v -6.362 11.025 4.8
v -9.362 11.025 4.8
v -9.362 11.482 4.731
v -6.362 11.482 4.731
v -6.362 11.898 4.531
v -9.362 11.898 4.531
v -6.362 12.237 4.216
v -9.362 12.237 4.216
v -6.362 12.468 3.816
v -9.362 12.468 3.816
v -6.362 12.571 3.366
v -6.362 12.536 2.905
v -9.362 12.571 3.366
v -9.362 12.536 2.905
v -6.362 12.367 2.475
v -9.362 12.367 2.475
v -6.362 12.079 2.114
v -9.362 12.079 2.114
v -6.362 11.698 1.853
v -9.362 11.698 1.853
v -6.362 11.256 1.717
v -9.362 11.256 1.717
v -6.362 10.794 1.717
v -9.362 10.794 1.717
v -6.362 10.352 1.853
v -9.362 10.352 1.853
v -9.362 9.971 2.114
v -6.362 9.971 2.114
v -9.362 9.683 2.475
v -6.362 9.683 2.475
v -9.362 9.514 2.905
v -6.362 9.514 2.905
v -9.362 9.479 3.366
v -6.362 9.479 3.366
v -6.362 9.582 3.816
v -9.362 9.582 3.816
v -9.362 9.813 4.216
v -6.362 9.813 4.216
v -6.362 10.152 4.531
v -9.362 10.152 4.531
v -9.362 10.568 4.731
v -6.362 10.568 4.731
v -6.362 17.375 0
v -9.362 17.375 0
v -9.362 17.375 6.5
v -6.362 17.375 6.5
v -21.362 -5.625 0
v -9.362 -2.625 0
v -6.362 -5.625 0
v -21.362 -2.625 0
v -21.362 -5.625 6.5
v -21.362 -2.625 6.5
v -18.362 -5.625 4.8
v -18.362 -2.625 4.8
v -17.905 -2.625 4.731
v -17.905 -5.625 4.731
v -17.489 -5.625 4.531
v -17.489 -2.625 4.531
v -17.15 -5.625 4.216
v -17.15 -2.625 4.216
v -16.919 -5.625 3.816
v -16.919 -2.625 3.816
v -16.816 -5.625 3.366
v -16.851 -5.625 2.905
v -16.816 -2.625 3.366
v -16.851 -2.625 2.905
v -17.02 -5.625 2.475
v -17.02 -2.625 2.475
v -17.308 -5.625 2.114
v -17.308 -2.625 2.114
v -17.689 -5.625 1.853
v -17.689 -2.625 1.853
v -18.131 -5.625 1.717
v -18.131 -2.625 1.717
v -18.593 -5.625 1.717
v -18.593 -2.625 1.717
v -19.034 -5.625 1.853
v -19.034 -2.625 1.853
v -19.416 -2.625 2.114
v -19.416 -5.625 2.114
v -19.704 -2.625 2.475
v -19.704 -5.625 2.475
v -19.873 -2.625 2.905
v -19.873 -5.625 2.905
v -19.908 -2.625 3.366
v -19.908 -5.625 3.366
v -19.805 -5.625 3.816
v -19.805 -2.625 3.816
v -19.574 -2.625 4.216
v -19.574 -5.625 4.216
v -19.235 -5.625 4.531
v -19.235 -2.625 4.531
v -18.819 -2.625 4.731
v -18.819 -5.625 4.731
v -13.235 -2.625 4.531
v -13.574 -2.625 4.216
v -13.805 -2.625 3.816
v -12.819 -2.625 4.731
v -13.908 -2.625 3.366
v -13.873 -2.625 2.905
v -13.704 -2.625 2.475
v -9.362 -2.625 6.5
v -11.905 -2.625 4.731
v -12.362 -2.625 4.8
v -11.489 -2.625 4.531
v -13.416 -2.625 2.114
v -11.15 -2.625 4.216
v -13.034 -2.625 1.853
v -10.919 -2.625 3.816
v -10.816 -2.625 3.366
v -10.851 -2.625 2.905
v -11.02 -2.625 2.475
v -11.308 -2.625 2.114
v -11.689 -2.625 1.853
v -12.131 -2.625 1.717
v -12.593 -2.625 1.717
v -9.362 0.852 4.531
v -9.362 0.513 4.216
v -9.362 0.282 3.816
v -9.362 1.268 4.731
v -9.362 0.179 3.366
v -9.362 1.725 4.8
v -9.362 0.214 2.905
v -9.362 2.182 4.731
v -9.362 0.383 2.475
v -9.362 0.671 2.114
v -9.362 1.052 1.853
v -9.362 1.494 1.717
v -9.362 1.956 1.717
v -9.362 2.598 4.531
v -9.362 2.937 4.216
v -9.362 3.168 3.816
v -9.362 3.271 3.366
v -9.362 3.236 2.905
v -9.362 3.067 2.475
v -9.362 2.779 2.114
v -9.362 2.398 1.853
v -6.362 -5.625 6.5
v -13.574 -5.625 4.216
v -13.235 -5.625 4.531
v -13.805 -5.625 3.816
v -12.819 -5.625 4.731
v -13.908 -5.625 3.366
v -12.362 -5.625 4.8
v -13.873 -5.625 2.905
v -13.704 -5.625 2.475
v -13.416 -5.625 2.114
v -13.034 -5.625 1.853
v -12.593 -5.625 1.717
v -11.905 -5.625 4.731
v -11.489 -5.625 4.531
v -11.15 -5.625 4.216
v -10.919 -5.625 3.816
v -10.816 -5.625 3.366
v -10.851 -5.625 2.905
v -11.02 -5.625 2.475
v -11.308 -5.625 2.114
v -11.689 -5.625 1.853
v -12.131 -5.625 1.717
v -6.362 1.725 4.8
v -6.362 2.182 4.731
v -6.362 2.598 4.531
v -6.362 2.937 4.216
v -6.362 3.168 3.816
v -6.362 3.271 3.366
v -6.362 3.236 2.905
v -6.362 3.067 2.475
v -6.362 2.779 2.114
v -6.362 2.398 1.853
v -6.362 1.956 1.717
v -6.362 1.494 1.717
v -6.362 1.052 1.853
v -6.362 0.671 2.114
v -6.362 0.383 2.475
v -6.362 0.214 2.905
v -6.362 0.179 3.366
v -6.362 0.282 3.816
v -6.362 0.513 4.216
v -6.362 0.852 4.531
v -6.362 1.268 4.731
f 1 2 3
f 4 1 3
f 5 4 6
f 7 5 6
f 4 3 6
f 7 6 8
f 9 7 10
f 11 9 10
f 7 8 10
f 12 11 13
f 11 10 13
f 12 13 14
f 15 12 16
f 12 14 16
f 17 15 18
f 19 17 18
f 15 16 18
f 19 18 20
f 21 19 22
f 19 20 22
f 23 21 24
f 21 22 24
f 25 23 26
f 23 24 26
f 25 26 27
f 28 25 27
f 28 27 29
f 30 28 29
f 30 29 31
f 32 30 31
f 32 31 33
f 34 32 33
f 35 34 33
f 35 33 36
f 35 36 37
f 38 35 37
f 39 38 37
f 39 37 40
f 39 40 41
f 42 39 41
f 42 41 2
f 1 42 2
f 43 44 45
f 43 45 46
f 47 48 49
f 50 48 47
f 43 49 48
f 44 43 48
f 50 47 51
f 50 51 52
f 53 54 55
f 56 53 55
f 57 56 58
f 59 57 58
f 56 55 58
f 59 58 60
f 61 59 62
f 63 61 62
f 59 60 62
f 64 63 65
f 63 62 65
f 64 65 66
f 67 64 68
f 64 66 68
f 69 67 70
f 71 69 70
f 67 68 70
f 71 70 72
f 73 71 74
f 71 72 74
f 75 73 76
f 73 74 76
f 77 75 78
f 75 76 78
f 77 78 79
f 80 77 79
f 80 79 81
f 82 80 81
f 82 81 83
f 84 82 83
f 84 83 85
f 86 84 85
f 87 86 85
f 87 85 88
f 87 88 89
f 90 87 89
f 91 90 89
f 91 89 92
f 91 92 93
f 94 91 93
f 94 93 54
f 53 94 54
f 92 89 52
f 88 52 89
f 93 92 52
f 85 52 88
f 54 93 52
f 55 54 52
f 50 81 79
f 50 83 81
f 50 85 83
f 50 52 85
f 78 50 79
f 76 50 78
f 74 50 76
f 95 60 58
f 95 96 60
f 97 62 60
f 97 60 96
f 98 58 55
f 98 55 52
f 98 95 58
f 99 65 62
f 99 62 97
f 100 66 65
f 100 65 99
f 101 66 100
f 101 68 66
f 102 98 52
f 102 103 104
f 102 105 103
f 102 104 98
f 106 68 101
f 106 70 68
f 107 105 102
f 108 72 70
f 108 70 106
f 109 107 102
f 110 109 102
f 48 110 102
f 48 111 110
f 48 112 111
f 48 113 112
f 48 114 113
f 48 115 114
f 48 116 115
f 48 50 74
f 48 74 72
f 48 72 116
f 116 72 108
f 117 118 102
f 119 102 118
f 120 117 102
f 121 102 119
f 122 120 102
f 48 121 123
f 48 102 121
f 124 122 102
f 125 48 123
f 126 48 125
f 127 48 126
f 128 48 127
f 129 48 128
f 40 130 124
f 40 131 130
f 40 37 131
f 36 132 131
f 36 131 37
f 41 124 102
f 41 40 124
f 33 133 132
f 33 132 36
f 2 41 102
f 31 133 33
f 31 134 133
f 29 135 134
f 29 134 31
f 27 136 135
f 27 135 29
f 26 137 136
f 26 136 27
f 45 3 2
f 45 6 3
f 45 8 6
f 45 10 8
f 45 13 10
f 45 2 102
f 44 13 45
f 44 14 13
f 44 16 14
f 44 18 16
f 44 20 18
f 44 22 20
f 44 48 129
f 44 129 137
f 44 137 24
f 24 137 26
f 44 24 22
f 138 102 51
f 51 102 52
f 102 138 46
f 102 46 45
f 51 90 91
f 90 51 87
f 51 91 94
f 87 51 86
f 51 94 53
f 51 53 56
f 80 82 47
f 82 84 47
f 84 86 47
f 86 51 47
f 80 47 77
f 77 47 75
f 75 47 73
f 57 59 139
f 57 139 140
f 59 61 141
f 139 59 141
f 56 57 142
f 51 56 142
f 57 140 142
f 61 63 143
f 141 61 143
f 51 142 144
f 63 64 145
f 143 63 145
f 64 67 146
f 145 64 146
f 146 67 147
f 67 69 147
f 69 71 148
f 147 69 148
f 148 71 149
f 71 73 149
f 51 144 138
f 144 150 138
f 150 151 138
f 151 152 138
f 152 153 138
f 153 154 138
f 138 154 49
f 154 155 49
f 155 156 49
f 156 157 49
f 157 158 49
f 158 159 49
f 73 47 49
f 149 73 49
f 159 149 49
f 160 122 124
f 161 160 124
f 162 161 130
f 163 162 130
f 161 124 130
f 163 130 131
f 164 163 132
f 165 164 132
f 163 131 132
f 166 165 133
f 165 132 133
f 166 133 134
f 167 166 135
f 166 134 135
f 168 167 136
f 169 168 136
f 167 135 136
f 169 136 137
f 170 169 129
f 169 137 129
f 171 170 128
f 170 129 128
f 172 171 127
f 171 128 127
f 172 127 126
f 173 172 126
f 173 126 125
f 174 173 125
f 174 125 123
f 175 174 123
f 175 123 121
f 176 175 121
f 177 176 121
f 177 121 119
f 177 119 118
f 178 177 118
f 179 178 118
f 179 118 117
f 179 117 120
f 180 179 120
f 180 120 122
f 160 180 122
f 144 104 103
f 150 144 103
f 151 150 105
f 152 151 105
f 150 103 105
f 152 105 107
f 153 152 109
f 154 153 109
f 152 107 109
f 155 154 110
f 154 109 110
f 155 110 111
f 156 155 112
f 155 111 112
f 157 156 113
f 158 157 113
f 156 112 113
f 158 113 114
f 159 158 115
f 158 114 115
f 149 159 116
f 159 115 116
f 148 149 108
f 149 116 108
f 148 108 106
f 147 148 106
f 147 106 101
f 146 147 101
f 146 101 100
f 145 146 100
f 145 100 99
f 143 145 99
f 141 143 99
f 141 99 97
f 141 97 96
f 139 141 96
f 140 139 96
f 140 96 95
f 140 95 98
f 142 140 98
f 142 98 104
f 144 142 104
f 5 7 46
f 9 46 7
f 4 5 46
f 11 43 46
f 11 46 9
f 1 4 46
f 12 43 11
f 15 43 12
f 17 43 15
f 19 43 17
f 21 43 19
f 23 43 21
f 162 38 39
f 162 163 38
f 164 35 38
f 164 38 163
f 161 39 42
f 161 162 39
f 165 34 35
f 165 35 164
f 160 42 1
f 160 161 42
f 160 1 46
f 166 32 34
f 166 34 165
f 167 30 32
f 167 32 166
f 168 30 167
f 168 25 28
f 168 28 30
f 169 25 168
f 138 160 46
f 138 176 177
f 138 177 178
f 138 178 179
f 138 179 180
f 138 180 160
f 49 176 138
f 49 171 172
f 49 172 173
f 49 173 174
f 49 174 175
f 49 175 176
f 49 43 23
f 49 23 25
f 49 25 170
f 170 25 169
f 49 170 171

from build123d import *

# Parameters (mm, degrees)
BOSS_EXTRUDE1_DEPTH = 6.5
SKETCH2_R           = 1.55
CUT_EXTRUDE1_DEPTH  = 10
SKETCH3_R           = 1.55
CUT_EXTRUDE2_DEPTH  = 10


with BuildPart() as part:
    # Sketch1 → Boss-Extrude1 (new body)
    with BuildSketch(Plane.XY):
        Polygon((-21.361853088, -2.625), (-9.361853088, -2.625), (-9.361853088, 17.375), (-6.361853088, 17.375), (-6.361853088, -5.625), (-9.361853088, -5.625), (-21.361853088, -5.625), align=None)
    extrude(amount=BOSS_EXTRUDE1_DEPTH)

    # Sketch2 → Cut-Extrude1 (cut)
    with BuildSketch(Plane(origin=(0, -2.625, 0), x_dir=(1, 0, 0), z_dir=(0, 1, 0))):
        with Locations(Location((-12.361853088, -3.25, 0), (0, 0, 270))):
            Circle(SKETCH2_R)
        with Locations(Location((-18.361853088, -3.25, 0), (0, 0, 270))):
            Circle(SKETCH2_R)
    extrude(amount=-CUT_EXTRUDE1_DEPTH, mode=Mode.SUBTRACT)

    # Sketch3 → Cut-Extrude2 (cut)
    with BuildSketch(Plane.ZY.offset(9.361853088)):
        with Locations((3.25, 1.725)):
            Circle(SKETCH3_R)
        with Locations((3.25, 11.025)):
            Circle(SKETCH3_R)
    extrude(amount=-CUT_EXTRUDE2_DEPTH, mode=Mode.SUBTRACT)


solid = part.part
